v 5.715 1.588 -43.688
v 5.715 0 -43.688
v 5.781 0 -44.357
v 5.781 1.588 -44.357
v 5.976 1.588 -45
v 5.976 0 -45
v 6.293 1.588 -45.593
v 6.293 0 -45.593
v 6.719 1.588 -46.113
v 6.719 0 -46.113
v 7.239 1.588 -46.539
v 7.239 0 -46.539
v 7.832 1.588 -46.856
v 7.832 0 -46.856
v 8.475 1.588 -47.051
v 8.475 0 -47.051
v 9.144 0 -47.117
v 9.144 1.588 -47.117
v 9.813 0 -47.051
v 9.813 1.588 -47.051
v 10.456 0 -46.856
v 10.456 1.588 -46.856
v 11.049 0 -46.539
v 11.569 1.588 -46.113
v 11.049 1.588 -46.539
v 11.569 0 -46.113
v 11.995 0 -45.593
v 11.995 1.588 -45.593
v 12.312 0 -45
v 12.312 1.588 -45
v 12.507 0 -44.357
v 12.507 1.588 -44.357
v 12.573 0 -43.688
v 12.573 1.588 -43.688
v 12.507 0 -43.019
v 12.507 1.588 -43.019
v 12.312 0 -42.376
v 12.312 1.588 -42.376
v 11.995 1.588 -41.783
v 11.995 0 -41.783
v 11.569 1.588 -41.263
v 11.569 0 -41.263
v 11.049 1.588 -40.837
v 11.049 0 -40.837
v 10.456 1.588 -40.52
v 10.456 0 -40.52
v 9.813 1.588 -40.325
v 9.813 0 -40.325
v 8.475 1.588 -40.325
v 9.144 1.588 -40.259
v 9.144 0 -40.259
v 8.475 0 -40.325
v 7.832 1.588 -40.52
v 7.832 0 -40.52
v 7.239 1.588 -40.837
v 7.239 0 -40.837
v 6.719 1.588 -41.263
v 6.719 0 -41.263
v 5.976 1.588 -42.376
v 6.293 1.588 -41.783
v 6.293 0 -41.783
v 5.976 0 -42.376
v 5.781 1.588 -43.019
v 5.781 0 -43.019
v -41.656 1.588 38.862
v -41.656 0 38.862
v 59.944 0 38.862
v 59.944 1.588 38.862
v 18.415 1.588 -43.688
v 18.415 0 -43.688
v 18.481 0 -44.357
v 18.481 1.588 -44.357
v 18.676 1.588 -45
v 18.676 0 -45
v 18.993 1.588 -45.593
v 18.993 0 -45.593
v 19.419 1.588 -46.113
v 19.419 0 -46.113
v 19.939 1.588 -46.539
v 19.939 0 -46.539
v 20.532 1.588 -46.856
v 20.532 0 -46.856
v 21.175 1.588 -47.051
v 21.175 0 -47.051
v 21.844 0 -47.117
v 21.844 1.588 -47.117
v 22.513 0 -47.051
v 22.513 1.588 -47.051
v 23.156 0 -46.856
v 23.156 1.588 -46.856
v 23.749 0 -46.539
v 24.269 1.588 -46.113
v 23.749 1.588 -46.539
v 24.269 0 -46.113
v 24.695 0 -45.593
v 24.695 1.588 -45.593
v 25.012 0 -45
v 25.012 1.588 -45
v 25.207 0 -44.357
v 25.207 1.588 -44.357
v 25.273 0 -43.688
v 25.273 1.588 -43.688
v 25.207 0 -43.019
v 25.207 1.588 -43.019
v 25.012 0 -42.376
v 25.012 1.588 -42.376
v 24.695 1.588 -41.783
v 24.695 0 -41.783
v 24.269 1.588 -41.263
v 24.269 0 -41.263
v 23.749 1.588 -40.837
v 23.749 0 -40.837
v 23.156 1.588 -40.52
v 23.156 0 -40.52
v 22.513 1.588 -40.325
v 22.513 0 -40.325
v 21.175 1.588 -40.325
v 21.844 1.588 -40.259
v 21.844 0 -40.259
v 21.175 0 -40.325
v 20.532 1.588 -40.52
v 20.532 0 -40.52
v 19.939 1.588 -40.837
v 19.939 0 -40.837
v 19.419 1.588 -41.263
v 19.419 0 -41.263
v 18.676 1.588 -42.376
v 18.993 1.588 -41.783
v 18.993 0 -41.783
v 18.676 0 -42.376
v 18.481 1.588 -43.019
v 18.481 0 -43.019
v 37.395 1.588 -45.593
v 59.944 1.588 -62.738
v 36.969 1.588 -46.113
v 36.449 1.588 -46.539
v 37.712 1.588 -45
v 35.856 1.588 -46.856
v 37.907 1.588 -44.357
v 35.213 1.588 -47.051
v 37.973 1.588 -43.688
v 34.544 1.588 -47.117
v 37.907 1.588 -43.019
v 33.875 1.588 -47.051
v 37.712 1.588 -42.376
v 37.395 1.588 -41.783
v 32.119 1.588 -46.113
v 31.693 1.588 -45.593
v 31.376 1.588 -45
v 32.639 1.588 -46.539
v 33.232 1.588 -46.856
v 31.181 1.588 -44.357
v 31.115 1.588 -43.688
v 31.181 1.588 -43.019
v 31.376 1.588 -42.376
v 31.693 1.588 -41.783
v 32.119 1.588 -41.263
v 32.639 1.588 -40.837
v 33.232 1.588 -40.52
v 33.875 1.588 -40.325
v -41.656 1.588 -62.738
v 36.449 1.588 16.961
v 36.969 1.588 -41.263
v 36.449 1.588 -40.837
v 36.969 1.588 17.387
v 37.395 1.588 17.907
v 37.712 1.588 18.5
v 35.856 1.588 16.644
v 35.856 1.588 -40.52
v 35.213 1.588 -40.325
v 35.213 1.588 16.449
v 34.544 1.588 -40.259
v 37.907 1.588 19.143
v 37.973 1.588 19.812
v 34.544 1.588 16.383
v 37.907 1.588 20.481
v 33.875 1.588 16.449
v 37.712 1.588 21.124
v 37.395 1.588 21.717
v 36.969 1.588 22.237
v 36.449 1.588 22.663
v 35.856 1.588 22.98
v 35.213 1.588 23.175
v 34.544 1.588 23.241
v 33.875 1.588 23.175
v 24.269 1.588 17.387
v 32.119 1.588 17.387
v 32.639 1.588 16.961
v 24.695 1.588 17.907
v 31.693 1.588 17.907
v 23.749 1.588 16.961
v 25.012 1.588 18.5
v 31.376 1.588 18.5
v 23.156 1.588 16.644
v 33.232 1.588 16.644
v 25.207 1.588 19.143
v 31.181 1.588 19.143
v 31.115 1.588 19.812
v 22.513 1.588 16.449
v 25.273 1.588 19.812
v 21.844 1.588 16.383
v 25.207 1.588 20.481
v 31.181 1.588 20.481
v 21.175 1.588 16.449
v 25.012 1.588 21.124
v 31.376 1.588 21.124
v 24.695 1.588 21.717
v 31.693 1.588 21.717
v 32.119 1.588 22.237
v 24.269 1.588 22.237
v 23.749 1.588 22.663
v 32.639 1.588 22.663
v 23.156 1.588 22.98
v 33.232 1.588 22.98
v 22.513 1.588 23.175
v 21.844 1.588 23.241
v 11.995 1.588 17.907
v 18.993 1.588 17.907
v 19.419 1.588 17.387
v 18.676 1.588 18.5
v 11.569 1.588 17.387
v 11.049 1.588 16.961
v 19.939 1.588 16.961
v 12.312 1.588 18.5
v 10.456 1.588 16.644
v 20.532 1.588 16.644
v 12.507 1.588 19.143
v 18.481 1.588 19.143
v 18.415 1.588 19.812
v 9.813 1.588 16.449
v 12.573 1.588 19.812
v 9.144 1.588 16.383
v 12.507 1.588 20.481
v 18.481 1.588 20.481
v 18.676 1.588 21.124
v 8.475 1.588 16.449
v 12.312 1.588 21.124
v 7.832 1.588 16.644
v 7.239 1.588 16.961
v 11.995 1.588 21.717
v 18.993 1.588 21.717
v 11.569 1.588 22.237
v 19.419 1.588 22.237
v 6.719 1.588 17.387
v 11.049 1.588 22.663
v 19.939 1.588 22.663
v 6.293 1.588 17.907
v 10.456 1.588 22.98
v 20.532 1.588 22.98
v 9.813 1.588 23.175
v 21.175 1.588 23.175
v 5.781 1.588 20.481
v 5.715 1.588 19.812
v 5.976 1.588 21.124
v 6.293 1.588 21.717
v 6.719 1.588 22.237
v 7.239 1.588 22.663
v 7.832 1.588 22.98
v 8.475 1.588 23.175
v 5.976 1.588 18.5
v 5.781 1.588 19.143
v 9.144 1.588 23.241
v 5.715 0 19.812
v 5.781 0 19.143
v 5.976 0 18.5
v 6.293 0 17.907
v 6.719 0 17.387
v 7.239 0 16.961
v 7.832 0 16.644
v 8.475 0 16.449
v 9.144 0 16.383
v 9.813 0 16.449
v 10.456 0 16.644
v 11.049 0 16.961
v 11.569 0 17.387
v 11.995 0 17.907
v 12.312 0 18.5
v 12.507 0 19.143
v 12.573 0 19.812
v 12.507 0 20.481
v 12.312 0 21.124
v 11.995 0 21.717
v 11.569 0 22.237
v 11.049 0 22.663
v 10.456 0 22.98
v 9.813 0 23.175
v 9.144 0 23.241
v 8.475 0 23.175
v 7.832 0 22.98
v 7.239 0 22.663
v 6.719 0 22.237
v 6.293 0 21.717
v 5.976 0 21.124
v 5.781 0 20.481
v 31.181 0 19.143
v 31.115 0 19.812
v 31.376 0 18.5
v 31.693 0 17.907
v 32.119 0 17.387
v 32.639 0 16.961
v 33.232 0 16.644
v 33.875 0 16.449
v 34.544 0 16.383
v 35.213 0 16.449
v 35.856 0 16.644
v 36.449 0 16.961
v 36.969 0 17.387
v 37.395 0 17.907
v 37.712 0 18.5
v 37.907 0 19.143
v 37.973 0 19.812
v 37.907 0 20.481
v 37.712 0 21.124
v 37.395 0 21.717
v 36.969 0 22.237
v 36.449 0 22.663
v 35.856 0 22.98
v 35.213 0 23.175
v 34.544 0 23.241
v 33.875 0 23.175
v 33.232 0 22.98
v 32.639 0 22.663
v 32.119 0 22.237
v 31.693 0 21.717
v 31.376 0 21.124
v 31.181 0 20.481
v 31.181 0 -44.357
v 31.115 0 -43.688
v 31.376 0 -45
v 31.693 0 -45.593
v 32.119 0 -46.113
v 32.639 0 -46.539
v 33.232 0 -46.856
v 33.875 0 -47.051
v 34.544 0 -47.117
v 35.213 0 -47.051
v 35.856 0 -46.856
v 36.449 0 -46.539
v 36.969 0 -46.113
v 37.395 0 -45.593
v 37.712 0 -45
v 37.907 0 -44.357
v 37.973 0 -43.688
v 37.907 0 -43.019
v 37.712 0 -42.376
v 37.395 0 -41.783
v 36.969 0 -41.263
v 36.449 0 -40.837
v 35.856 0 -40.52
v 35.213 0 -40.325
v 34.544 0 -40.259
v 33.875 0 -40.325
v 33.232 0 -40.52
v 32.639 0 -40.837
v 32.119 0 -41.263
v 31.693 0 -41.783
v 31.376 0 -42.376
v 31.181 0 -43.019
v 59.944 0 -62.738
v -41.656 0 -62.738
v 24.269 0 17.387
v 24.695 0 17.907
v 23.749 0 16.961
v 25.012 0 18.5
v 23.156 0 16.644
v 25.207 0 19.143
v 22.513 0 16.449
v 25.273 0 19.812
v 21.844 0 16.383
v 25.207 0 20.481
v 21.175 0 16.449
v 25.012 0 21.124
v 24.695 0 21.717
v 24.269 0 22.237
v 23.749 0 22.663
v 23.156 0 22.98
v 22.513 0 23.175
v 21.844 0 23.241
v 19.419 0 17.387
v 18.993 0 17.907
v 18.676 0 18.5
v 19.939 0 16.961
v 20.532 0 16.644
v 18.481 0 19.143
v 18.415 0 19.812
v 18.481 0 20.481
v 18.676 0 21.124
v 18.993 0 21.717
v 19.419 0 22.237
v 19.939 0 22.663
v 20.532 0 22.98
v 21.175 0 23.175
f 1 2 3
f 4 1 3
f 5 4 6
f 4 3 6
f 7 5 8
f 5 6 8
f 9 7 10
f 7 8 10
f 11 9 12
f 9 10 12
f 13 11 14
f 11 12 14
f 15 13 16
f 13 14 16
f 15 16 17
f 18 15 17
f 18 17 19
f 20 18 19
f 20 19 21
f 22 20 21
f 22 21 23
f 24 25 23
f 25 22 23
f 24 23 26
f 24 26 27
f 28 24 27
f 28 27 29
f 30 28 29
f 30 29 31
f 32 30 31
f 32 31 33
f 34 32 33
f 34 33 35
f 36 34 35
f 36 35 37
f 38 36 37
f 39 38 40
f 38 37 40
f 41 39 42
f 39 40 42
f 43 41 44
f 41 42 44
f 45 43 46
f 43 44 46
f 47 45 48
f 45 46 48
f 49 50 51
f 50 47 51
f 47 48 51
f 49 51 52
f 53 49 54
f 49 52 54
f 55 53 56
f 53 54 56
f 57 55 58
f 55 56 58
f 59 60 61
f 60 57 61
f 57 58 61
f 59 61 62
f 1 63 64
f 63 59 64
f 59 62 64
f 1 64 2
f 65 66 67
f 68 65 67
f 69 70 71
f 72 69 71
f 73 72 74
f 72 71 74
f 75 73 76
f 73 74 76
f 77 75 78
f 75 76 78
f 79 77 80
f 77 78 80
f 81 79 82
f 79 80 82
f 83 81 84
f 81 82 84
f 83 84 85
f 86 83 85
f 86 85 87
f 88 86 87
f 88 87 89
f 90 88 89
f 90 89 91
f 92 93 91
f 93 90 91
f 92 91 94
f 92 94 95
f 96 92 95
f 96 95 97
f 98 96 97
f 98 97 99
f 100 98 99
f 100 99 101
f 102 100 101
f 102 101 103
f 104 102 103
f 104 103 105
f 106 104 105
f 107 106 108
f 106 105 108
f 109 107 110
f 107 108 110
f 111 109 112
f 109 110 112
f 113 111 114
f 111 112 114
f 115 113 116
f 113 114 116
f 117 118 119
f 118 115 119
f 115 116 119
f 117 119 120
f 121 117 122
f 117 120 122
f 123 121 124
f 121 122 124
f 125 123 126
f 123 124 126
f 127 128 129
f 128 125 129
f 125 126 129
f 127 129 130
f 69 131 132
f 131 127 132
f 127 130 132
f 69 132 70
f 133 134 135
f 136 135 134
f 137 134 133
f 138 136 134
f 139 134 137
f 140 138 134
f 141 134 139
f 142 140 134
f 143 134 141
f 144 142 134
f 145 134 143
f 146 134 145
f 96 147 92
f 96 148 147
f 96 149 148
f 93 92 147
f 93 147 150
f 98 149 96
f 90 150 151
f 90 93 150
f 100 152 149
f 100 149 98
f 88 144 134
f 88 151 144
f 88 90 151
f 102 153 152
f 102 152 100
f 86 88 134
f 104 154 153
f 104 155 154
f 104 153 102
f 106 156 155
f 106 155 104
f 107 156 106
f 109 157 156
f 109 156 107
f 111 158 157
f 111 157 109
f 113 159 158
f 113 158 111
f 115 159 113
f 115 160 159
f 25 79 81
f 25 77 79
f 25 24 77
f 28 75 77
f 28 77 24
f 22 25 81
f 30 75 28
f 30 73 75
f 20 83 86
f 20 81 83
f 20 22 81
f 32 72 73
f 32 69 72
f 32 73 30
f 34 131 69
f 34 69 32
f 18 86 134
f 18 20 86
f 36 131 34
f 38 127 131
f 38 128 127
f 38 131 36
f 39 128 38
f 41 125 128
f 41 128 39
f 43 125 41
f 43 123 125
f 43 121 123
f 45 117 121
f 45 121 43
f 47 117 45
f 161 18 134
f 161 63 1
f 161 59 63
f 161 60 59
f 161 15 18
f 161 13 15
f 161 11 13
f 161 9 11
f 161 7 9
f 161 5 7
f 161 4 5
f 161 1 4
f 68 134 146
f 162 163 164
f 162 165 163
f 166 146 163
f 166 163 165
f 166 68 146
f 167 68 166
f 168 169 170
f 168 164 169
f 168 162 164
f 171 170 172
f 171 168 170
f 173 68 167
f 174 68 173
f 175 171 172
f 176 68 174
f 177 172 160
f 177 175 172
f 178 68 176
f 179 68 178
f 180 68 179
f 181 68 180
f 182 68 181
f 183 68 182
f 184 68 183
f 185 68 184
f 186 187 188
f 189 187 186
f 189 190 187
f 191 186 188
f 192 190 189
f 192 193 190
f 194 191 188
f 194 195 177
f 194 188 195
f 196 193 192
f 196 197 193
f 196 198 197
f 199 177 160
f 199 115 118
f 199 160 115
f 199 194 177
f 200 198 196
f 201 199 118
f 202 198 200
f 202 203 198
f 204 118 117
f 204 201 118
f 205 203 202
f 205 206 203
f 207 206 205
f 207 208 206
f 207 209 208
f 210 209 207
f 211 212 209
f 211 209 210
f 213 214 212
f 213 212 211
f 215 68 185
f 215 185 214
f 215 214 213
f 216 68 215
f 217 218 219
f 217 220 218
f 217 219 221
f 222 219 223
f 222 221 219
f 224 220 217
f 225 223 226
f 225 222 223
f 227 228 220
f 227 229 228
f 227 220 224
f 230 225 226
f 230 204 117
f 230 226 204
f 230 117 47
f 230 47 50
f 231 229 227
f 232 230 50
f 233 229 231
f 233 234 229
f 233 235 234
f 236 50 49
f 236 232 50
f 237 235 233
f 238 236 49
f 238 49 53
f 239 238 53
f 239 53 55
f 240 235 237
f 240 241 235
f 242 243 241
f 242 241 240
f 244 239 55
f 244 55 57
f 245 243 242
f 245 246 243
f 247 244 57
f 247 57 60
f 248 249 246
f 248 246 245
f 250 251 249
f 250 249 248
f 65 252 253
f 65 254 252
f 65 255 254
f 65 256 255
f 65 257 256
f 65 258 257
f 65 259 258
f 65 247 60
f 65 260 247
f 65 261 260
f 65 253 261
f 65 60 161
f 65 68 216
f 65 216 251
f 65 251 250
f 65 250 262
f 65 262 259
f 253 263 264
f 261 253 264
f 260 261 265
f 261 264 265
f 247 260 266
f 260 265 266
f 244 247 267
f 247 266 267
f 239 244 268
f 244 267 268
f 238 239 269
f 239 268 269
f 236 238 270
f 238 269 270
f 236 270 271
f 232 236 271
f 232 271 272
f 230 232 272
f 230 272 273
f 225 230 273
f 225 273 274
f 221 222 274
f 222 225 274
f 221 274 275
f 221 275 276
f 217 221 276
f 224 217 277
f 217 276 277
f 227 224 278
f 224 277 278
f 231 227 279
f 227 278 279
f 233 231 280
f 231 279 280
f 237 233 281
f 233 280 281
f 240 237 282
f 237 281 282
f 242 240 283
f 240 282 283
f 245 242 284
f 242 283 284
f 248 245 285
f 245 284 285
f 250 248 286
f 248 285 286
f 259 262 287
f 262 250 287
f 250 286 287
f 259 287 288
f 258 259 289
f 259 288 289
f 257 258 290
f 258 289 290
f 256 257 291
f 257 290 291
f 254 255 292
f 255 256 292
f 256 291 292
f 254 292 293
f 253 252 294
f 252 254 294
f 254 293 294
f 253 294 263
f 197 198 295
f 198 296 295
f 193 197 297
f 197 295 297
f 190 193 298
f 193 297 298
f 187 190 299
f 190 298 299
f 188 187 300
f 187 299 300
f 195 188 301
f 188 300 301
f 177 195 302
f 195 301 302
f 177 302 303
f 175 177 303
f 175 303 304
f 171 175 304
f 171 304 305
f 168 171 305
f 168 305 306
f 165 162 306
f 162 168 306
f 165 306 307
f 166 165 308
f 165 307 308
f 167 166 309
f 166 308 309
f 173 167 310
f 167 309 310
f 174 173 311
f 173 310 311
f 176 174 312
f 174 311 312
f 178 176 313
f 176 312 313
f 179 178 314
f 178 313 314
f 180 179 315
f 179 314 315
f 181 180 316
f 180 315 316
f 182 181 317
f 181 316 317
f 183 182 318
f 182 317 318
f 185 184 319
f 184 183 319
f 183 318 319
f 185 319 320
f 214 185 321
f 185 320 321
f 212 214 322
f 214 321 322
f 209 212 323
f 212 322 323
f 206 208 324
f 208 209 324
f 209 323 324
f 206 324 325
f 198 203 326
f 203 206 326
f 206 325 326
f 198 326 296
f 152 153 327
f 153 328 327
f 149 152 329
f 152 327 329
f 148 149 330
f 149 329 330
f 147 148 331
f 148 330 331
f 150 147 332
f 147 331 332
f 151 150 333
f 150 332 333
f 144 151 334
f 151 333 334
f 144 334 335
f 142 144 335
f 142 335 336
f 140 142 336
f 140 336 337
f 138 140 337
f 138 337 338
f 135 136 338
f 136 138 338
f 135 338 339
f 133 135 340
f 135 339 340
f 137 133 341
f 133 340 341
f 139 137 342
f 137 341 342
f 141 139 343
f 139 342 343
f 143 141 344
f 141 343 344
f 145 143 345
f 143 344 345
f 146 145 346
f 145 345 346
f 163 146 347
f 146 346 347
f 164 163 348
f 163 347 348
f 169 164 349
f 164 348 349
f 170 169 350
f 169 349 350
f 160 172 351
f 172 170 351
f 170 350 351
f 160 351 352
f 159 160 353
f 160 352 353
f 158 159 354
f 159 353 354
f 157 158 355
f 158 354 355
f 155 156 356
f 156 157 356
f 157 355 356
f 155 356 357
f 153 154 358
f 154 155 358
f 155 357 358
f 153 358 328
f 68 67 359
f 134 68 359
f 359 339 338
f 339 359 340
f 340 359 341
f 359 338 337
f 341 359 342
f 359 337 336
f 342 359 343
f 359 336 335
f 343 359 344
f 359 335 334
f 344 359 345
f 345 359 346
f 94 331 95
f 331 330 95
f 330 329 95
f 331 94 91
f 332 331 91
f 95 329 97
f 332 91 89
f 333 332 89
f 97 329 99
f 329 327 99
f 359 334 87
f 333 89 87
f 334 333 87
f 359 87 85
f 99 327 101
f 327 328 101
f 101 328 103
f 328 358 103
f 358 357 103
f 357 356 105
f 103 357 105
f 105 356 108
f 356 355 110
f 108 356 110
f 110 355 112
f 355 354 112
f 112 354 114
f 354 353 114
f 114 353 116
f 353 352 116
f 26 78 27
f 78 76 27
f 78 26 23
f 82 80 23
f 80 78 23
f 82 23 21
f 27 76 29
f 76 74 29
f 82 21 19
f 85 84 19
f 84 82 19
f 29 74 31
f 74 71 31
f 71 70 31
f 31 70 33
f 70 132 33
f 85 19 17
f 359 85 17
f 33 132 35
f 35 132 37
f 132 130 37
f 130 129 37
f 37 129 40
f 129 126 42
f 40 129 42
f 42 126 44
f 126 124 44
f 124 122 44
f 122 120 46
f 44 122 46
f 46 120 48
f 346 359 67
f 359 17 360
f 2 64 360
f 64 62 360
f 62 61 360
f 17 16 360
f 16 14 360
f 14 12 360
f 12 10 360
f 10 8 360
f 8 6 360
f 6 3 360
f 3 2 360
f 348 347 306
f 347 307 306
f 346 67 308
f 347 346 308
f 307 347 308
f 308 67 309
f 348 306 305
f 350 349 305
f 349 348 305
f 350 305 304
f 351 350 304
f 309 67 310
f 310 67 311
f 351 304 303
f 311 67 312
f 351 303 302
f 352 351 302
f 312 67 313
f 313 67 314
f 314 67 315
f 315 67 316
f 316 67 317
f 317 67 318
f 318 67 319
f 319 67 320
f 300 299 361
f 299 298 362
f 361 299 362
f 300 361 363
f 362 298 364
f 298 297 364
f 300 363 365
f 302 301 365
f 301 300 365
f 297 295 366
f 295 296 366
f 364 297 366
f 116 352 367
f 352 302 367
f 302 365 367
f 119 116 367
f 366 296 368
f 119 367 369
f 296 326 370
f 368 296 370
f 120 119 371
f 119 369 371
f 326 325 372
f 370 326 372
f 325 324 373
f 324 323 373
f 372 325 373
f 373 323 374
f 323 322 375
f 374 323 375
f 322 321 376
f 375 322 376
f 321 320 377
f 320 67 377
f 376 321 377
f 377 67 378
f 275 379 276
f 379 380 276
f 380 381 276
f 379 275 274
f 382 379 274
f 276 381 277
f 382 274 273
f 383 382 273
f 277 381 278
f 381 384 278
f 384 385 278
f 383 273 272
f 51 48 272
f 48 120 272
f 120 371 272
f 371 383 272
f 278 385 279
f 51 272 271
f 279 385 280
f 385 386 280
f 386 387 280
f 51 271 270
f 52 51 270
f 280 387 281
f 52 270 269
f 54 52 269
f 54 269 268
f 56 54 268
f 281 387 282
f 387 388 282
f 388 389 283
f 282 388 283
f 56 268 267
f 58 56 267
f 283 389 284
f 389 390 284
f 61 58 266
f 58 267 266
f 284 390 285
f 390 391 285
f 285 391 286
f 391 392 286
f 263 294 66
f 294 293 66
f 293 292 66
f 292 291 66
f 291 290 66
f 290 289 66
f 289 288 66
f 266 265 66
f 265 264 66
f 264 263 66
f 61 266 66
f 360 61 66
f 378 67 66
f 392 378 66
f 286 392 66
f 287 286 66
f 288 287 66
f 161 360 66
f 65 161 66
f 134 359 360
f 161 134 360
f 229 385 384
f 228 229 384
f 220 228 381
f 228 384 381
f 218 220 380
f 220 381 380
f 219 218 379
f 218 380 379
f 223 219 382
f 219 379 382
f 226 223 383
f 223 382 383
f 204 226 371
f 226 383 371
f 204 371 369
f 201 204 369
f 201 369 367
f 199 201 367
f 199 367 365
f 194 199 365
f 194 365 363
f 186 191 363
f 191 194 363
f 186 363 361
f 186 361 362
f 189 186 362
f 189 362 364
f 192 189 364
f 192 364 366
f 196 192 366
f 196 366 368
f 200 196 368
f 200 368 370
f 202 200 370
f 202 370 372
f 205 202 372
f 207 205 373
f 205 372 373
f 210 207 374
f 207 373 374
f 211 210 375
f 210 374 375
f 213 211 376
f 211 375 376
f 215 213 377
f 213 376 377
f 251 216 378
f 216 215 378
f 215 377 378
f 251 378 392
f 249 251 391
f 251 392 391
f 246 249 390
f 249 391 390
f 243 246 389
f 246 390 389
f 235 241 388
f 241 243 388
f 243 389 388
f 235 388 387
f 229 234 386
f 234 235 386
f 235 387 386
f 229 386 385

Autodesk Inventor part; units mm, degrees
ref_plane "YZ Plane" through (0, 0, 0) normal (1, 0, 0) x (0, 1, 0)
ref_plane "XZ Plane" through (0, 0, 0) normal (0, 1, 0) x (-1, 0, 0)
ref_plane "XY Plane" through (0, 0, 0) normal (0, 0, 1) x (1, 0, 0)
sketch "Sketch1" plane through (0, 0, 0) normal (0, 1, 0) x (-1, 0, 0)
  line L0 (41.656, 38.862) -> (-59.944, 38.862)
  line L1 (-59.944, 38.862) -> (-59.944, -62.738)
  line L2 (-59.944, -62.738) -> (41.656, -62.738)
  line L3 (41.656, -62.738) -> (41.656, 38.862)
  circle A0 centre (-9.144, 19.812) radius 3.429
  circle A1 centre (-21.844, 19.812) radius 3.429
  circle A2 centre (-34.544, 19.812) radius 3.429
  circle A3 centre (-9.144, -43.688) radius 3.429
  circle A4 centre (-21.844, -43.688) radius 3.429
  circle A5 centre (-34.544, -43.688) radius 3.429
  point P0 (0, 0)
  point P1 (-9.144, 19.812)
  point P2 (-9.144, -43.688)
  point P3 (-9.144, -43.688)
  dimension "d0" = 101.6
  dimension "d1" = 101.6
  dimension "d3" = 6.858
  dimension "d4" = 12.7
  dimension "d5" = 12.7
  dimension "d6" = 25.4
  dimension "d8" = 19.05
  dimension "d9" = 19.05
  dimension "d10" = 6.858
  dimension "d11" = 12.7
  dimension "d12" = 12.7
extrude "Extrusion1" add sketch "Sketch1" along normal blind 1.5875
properties part number "Slider"
